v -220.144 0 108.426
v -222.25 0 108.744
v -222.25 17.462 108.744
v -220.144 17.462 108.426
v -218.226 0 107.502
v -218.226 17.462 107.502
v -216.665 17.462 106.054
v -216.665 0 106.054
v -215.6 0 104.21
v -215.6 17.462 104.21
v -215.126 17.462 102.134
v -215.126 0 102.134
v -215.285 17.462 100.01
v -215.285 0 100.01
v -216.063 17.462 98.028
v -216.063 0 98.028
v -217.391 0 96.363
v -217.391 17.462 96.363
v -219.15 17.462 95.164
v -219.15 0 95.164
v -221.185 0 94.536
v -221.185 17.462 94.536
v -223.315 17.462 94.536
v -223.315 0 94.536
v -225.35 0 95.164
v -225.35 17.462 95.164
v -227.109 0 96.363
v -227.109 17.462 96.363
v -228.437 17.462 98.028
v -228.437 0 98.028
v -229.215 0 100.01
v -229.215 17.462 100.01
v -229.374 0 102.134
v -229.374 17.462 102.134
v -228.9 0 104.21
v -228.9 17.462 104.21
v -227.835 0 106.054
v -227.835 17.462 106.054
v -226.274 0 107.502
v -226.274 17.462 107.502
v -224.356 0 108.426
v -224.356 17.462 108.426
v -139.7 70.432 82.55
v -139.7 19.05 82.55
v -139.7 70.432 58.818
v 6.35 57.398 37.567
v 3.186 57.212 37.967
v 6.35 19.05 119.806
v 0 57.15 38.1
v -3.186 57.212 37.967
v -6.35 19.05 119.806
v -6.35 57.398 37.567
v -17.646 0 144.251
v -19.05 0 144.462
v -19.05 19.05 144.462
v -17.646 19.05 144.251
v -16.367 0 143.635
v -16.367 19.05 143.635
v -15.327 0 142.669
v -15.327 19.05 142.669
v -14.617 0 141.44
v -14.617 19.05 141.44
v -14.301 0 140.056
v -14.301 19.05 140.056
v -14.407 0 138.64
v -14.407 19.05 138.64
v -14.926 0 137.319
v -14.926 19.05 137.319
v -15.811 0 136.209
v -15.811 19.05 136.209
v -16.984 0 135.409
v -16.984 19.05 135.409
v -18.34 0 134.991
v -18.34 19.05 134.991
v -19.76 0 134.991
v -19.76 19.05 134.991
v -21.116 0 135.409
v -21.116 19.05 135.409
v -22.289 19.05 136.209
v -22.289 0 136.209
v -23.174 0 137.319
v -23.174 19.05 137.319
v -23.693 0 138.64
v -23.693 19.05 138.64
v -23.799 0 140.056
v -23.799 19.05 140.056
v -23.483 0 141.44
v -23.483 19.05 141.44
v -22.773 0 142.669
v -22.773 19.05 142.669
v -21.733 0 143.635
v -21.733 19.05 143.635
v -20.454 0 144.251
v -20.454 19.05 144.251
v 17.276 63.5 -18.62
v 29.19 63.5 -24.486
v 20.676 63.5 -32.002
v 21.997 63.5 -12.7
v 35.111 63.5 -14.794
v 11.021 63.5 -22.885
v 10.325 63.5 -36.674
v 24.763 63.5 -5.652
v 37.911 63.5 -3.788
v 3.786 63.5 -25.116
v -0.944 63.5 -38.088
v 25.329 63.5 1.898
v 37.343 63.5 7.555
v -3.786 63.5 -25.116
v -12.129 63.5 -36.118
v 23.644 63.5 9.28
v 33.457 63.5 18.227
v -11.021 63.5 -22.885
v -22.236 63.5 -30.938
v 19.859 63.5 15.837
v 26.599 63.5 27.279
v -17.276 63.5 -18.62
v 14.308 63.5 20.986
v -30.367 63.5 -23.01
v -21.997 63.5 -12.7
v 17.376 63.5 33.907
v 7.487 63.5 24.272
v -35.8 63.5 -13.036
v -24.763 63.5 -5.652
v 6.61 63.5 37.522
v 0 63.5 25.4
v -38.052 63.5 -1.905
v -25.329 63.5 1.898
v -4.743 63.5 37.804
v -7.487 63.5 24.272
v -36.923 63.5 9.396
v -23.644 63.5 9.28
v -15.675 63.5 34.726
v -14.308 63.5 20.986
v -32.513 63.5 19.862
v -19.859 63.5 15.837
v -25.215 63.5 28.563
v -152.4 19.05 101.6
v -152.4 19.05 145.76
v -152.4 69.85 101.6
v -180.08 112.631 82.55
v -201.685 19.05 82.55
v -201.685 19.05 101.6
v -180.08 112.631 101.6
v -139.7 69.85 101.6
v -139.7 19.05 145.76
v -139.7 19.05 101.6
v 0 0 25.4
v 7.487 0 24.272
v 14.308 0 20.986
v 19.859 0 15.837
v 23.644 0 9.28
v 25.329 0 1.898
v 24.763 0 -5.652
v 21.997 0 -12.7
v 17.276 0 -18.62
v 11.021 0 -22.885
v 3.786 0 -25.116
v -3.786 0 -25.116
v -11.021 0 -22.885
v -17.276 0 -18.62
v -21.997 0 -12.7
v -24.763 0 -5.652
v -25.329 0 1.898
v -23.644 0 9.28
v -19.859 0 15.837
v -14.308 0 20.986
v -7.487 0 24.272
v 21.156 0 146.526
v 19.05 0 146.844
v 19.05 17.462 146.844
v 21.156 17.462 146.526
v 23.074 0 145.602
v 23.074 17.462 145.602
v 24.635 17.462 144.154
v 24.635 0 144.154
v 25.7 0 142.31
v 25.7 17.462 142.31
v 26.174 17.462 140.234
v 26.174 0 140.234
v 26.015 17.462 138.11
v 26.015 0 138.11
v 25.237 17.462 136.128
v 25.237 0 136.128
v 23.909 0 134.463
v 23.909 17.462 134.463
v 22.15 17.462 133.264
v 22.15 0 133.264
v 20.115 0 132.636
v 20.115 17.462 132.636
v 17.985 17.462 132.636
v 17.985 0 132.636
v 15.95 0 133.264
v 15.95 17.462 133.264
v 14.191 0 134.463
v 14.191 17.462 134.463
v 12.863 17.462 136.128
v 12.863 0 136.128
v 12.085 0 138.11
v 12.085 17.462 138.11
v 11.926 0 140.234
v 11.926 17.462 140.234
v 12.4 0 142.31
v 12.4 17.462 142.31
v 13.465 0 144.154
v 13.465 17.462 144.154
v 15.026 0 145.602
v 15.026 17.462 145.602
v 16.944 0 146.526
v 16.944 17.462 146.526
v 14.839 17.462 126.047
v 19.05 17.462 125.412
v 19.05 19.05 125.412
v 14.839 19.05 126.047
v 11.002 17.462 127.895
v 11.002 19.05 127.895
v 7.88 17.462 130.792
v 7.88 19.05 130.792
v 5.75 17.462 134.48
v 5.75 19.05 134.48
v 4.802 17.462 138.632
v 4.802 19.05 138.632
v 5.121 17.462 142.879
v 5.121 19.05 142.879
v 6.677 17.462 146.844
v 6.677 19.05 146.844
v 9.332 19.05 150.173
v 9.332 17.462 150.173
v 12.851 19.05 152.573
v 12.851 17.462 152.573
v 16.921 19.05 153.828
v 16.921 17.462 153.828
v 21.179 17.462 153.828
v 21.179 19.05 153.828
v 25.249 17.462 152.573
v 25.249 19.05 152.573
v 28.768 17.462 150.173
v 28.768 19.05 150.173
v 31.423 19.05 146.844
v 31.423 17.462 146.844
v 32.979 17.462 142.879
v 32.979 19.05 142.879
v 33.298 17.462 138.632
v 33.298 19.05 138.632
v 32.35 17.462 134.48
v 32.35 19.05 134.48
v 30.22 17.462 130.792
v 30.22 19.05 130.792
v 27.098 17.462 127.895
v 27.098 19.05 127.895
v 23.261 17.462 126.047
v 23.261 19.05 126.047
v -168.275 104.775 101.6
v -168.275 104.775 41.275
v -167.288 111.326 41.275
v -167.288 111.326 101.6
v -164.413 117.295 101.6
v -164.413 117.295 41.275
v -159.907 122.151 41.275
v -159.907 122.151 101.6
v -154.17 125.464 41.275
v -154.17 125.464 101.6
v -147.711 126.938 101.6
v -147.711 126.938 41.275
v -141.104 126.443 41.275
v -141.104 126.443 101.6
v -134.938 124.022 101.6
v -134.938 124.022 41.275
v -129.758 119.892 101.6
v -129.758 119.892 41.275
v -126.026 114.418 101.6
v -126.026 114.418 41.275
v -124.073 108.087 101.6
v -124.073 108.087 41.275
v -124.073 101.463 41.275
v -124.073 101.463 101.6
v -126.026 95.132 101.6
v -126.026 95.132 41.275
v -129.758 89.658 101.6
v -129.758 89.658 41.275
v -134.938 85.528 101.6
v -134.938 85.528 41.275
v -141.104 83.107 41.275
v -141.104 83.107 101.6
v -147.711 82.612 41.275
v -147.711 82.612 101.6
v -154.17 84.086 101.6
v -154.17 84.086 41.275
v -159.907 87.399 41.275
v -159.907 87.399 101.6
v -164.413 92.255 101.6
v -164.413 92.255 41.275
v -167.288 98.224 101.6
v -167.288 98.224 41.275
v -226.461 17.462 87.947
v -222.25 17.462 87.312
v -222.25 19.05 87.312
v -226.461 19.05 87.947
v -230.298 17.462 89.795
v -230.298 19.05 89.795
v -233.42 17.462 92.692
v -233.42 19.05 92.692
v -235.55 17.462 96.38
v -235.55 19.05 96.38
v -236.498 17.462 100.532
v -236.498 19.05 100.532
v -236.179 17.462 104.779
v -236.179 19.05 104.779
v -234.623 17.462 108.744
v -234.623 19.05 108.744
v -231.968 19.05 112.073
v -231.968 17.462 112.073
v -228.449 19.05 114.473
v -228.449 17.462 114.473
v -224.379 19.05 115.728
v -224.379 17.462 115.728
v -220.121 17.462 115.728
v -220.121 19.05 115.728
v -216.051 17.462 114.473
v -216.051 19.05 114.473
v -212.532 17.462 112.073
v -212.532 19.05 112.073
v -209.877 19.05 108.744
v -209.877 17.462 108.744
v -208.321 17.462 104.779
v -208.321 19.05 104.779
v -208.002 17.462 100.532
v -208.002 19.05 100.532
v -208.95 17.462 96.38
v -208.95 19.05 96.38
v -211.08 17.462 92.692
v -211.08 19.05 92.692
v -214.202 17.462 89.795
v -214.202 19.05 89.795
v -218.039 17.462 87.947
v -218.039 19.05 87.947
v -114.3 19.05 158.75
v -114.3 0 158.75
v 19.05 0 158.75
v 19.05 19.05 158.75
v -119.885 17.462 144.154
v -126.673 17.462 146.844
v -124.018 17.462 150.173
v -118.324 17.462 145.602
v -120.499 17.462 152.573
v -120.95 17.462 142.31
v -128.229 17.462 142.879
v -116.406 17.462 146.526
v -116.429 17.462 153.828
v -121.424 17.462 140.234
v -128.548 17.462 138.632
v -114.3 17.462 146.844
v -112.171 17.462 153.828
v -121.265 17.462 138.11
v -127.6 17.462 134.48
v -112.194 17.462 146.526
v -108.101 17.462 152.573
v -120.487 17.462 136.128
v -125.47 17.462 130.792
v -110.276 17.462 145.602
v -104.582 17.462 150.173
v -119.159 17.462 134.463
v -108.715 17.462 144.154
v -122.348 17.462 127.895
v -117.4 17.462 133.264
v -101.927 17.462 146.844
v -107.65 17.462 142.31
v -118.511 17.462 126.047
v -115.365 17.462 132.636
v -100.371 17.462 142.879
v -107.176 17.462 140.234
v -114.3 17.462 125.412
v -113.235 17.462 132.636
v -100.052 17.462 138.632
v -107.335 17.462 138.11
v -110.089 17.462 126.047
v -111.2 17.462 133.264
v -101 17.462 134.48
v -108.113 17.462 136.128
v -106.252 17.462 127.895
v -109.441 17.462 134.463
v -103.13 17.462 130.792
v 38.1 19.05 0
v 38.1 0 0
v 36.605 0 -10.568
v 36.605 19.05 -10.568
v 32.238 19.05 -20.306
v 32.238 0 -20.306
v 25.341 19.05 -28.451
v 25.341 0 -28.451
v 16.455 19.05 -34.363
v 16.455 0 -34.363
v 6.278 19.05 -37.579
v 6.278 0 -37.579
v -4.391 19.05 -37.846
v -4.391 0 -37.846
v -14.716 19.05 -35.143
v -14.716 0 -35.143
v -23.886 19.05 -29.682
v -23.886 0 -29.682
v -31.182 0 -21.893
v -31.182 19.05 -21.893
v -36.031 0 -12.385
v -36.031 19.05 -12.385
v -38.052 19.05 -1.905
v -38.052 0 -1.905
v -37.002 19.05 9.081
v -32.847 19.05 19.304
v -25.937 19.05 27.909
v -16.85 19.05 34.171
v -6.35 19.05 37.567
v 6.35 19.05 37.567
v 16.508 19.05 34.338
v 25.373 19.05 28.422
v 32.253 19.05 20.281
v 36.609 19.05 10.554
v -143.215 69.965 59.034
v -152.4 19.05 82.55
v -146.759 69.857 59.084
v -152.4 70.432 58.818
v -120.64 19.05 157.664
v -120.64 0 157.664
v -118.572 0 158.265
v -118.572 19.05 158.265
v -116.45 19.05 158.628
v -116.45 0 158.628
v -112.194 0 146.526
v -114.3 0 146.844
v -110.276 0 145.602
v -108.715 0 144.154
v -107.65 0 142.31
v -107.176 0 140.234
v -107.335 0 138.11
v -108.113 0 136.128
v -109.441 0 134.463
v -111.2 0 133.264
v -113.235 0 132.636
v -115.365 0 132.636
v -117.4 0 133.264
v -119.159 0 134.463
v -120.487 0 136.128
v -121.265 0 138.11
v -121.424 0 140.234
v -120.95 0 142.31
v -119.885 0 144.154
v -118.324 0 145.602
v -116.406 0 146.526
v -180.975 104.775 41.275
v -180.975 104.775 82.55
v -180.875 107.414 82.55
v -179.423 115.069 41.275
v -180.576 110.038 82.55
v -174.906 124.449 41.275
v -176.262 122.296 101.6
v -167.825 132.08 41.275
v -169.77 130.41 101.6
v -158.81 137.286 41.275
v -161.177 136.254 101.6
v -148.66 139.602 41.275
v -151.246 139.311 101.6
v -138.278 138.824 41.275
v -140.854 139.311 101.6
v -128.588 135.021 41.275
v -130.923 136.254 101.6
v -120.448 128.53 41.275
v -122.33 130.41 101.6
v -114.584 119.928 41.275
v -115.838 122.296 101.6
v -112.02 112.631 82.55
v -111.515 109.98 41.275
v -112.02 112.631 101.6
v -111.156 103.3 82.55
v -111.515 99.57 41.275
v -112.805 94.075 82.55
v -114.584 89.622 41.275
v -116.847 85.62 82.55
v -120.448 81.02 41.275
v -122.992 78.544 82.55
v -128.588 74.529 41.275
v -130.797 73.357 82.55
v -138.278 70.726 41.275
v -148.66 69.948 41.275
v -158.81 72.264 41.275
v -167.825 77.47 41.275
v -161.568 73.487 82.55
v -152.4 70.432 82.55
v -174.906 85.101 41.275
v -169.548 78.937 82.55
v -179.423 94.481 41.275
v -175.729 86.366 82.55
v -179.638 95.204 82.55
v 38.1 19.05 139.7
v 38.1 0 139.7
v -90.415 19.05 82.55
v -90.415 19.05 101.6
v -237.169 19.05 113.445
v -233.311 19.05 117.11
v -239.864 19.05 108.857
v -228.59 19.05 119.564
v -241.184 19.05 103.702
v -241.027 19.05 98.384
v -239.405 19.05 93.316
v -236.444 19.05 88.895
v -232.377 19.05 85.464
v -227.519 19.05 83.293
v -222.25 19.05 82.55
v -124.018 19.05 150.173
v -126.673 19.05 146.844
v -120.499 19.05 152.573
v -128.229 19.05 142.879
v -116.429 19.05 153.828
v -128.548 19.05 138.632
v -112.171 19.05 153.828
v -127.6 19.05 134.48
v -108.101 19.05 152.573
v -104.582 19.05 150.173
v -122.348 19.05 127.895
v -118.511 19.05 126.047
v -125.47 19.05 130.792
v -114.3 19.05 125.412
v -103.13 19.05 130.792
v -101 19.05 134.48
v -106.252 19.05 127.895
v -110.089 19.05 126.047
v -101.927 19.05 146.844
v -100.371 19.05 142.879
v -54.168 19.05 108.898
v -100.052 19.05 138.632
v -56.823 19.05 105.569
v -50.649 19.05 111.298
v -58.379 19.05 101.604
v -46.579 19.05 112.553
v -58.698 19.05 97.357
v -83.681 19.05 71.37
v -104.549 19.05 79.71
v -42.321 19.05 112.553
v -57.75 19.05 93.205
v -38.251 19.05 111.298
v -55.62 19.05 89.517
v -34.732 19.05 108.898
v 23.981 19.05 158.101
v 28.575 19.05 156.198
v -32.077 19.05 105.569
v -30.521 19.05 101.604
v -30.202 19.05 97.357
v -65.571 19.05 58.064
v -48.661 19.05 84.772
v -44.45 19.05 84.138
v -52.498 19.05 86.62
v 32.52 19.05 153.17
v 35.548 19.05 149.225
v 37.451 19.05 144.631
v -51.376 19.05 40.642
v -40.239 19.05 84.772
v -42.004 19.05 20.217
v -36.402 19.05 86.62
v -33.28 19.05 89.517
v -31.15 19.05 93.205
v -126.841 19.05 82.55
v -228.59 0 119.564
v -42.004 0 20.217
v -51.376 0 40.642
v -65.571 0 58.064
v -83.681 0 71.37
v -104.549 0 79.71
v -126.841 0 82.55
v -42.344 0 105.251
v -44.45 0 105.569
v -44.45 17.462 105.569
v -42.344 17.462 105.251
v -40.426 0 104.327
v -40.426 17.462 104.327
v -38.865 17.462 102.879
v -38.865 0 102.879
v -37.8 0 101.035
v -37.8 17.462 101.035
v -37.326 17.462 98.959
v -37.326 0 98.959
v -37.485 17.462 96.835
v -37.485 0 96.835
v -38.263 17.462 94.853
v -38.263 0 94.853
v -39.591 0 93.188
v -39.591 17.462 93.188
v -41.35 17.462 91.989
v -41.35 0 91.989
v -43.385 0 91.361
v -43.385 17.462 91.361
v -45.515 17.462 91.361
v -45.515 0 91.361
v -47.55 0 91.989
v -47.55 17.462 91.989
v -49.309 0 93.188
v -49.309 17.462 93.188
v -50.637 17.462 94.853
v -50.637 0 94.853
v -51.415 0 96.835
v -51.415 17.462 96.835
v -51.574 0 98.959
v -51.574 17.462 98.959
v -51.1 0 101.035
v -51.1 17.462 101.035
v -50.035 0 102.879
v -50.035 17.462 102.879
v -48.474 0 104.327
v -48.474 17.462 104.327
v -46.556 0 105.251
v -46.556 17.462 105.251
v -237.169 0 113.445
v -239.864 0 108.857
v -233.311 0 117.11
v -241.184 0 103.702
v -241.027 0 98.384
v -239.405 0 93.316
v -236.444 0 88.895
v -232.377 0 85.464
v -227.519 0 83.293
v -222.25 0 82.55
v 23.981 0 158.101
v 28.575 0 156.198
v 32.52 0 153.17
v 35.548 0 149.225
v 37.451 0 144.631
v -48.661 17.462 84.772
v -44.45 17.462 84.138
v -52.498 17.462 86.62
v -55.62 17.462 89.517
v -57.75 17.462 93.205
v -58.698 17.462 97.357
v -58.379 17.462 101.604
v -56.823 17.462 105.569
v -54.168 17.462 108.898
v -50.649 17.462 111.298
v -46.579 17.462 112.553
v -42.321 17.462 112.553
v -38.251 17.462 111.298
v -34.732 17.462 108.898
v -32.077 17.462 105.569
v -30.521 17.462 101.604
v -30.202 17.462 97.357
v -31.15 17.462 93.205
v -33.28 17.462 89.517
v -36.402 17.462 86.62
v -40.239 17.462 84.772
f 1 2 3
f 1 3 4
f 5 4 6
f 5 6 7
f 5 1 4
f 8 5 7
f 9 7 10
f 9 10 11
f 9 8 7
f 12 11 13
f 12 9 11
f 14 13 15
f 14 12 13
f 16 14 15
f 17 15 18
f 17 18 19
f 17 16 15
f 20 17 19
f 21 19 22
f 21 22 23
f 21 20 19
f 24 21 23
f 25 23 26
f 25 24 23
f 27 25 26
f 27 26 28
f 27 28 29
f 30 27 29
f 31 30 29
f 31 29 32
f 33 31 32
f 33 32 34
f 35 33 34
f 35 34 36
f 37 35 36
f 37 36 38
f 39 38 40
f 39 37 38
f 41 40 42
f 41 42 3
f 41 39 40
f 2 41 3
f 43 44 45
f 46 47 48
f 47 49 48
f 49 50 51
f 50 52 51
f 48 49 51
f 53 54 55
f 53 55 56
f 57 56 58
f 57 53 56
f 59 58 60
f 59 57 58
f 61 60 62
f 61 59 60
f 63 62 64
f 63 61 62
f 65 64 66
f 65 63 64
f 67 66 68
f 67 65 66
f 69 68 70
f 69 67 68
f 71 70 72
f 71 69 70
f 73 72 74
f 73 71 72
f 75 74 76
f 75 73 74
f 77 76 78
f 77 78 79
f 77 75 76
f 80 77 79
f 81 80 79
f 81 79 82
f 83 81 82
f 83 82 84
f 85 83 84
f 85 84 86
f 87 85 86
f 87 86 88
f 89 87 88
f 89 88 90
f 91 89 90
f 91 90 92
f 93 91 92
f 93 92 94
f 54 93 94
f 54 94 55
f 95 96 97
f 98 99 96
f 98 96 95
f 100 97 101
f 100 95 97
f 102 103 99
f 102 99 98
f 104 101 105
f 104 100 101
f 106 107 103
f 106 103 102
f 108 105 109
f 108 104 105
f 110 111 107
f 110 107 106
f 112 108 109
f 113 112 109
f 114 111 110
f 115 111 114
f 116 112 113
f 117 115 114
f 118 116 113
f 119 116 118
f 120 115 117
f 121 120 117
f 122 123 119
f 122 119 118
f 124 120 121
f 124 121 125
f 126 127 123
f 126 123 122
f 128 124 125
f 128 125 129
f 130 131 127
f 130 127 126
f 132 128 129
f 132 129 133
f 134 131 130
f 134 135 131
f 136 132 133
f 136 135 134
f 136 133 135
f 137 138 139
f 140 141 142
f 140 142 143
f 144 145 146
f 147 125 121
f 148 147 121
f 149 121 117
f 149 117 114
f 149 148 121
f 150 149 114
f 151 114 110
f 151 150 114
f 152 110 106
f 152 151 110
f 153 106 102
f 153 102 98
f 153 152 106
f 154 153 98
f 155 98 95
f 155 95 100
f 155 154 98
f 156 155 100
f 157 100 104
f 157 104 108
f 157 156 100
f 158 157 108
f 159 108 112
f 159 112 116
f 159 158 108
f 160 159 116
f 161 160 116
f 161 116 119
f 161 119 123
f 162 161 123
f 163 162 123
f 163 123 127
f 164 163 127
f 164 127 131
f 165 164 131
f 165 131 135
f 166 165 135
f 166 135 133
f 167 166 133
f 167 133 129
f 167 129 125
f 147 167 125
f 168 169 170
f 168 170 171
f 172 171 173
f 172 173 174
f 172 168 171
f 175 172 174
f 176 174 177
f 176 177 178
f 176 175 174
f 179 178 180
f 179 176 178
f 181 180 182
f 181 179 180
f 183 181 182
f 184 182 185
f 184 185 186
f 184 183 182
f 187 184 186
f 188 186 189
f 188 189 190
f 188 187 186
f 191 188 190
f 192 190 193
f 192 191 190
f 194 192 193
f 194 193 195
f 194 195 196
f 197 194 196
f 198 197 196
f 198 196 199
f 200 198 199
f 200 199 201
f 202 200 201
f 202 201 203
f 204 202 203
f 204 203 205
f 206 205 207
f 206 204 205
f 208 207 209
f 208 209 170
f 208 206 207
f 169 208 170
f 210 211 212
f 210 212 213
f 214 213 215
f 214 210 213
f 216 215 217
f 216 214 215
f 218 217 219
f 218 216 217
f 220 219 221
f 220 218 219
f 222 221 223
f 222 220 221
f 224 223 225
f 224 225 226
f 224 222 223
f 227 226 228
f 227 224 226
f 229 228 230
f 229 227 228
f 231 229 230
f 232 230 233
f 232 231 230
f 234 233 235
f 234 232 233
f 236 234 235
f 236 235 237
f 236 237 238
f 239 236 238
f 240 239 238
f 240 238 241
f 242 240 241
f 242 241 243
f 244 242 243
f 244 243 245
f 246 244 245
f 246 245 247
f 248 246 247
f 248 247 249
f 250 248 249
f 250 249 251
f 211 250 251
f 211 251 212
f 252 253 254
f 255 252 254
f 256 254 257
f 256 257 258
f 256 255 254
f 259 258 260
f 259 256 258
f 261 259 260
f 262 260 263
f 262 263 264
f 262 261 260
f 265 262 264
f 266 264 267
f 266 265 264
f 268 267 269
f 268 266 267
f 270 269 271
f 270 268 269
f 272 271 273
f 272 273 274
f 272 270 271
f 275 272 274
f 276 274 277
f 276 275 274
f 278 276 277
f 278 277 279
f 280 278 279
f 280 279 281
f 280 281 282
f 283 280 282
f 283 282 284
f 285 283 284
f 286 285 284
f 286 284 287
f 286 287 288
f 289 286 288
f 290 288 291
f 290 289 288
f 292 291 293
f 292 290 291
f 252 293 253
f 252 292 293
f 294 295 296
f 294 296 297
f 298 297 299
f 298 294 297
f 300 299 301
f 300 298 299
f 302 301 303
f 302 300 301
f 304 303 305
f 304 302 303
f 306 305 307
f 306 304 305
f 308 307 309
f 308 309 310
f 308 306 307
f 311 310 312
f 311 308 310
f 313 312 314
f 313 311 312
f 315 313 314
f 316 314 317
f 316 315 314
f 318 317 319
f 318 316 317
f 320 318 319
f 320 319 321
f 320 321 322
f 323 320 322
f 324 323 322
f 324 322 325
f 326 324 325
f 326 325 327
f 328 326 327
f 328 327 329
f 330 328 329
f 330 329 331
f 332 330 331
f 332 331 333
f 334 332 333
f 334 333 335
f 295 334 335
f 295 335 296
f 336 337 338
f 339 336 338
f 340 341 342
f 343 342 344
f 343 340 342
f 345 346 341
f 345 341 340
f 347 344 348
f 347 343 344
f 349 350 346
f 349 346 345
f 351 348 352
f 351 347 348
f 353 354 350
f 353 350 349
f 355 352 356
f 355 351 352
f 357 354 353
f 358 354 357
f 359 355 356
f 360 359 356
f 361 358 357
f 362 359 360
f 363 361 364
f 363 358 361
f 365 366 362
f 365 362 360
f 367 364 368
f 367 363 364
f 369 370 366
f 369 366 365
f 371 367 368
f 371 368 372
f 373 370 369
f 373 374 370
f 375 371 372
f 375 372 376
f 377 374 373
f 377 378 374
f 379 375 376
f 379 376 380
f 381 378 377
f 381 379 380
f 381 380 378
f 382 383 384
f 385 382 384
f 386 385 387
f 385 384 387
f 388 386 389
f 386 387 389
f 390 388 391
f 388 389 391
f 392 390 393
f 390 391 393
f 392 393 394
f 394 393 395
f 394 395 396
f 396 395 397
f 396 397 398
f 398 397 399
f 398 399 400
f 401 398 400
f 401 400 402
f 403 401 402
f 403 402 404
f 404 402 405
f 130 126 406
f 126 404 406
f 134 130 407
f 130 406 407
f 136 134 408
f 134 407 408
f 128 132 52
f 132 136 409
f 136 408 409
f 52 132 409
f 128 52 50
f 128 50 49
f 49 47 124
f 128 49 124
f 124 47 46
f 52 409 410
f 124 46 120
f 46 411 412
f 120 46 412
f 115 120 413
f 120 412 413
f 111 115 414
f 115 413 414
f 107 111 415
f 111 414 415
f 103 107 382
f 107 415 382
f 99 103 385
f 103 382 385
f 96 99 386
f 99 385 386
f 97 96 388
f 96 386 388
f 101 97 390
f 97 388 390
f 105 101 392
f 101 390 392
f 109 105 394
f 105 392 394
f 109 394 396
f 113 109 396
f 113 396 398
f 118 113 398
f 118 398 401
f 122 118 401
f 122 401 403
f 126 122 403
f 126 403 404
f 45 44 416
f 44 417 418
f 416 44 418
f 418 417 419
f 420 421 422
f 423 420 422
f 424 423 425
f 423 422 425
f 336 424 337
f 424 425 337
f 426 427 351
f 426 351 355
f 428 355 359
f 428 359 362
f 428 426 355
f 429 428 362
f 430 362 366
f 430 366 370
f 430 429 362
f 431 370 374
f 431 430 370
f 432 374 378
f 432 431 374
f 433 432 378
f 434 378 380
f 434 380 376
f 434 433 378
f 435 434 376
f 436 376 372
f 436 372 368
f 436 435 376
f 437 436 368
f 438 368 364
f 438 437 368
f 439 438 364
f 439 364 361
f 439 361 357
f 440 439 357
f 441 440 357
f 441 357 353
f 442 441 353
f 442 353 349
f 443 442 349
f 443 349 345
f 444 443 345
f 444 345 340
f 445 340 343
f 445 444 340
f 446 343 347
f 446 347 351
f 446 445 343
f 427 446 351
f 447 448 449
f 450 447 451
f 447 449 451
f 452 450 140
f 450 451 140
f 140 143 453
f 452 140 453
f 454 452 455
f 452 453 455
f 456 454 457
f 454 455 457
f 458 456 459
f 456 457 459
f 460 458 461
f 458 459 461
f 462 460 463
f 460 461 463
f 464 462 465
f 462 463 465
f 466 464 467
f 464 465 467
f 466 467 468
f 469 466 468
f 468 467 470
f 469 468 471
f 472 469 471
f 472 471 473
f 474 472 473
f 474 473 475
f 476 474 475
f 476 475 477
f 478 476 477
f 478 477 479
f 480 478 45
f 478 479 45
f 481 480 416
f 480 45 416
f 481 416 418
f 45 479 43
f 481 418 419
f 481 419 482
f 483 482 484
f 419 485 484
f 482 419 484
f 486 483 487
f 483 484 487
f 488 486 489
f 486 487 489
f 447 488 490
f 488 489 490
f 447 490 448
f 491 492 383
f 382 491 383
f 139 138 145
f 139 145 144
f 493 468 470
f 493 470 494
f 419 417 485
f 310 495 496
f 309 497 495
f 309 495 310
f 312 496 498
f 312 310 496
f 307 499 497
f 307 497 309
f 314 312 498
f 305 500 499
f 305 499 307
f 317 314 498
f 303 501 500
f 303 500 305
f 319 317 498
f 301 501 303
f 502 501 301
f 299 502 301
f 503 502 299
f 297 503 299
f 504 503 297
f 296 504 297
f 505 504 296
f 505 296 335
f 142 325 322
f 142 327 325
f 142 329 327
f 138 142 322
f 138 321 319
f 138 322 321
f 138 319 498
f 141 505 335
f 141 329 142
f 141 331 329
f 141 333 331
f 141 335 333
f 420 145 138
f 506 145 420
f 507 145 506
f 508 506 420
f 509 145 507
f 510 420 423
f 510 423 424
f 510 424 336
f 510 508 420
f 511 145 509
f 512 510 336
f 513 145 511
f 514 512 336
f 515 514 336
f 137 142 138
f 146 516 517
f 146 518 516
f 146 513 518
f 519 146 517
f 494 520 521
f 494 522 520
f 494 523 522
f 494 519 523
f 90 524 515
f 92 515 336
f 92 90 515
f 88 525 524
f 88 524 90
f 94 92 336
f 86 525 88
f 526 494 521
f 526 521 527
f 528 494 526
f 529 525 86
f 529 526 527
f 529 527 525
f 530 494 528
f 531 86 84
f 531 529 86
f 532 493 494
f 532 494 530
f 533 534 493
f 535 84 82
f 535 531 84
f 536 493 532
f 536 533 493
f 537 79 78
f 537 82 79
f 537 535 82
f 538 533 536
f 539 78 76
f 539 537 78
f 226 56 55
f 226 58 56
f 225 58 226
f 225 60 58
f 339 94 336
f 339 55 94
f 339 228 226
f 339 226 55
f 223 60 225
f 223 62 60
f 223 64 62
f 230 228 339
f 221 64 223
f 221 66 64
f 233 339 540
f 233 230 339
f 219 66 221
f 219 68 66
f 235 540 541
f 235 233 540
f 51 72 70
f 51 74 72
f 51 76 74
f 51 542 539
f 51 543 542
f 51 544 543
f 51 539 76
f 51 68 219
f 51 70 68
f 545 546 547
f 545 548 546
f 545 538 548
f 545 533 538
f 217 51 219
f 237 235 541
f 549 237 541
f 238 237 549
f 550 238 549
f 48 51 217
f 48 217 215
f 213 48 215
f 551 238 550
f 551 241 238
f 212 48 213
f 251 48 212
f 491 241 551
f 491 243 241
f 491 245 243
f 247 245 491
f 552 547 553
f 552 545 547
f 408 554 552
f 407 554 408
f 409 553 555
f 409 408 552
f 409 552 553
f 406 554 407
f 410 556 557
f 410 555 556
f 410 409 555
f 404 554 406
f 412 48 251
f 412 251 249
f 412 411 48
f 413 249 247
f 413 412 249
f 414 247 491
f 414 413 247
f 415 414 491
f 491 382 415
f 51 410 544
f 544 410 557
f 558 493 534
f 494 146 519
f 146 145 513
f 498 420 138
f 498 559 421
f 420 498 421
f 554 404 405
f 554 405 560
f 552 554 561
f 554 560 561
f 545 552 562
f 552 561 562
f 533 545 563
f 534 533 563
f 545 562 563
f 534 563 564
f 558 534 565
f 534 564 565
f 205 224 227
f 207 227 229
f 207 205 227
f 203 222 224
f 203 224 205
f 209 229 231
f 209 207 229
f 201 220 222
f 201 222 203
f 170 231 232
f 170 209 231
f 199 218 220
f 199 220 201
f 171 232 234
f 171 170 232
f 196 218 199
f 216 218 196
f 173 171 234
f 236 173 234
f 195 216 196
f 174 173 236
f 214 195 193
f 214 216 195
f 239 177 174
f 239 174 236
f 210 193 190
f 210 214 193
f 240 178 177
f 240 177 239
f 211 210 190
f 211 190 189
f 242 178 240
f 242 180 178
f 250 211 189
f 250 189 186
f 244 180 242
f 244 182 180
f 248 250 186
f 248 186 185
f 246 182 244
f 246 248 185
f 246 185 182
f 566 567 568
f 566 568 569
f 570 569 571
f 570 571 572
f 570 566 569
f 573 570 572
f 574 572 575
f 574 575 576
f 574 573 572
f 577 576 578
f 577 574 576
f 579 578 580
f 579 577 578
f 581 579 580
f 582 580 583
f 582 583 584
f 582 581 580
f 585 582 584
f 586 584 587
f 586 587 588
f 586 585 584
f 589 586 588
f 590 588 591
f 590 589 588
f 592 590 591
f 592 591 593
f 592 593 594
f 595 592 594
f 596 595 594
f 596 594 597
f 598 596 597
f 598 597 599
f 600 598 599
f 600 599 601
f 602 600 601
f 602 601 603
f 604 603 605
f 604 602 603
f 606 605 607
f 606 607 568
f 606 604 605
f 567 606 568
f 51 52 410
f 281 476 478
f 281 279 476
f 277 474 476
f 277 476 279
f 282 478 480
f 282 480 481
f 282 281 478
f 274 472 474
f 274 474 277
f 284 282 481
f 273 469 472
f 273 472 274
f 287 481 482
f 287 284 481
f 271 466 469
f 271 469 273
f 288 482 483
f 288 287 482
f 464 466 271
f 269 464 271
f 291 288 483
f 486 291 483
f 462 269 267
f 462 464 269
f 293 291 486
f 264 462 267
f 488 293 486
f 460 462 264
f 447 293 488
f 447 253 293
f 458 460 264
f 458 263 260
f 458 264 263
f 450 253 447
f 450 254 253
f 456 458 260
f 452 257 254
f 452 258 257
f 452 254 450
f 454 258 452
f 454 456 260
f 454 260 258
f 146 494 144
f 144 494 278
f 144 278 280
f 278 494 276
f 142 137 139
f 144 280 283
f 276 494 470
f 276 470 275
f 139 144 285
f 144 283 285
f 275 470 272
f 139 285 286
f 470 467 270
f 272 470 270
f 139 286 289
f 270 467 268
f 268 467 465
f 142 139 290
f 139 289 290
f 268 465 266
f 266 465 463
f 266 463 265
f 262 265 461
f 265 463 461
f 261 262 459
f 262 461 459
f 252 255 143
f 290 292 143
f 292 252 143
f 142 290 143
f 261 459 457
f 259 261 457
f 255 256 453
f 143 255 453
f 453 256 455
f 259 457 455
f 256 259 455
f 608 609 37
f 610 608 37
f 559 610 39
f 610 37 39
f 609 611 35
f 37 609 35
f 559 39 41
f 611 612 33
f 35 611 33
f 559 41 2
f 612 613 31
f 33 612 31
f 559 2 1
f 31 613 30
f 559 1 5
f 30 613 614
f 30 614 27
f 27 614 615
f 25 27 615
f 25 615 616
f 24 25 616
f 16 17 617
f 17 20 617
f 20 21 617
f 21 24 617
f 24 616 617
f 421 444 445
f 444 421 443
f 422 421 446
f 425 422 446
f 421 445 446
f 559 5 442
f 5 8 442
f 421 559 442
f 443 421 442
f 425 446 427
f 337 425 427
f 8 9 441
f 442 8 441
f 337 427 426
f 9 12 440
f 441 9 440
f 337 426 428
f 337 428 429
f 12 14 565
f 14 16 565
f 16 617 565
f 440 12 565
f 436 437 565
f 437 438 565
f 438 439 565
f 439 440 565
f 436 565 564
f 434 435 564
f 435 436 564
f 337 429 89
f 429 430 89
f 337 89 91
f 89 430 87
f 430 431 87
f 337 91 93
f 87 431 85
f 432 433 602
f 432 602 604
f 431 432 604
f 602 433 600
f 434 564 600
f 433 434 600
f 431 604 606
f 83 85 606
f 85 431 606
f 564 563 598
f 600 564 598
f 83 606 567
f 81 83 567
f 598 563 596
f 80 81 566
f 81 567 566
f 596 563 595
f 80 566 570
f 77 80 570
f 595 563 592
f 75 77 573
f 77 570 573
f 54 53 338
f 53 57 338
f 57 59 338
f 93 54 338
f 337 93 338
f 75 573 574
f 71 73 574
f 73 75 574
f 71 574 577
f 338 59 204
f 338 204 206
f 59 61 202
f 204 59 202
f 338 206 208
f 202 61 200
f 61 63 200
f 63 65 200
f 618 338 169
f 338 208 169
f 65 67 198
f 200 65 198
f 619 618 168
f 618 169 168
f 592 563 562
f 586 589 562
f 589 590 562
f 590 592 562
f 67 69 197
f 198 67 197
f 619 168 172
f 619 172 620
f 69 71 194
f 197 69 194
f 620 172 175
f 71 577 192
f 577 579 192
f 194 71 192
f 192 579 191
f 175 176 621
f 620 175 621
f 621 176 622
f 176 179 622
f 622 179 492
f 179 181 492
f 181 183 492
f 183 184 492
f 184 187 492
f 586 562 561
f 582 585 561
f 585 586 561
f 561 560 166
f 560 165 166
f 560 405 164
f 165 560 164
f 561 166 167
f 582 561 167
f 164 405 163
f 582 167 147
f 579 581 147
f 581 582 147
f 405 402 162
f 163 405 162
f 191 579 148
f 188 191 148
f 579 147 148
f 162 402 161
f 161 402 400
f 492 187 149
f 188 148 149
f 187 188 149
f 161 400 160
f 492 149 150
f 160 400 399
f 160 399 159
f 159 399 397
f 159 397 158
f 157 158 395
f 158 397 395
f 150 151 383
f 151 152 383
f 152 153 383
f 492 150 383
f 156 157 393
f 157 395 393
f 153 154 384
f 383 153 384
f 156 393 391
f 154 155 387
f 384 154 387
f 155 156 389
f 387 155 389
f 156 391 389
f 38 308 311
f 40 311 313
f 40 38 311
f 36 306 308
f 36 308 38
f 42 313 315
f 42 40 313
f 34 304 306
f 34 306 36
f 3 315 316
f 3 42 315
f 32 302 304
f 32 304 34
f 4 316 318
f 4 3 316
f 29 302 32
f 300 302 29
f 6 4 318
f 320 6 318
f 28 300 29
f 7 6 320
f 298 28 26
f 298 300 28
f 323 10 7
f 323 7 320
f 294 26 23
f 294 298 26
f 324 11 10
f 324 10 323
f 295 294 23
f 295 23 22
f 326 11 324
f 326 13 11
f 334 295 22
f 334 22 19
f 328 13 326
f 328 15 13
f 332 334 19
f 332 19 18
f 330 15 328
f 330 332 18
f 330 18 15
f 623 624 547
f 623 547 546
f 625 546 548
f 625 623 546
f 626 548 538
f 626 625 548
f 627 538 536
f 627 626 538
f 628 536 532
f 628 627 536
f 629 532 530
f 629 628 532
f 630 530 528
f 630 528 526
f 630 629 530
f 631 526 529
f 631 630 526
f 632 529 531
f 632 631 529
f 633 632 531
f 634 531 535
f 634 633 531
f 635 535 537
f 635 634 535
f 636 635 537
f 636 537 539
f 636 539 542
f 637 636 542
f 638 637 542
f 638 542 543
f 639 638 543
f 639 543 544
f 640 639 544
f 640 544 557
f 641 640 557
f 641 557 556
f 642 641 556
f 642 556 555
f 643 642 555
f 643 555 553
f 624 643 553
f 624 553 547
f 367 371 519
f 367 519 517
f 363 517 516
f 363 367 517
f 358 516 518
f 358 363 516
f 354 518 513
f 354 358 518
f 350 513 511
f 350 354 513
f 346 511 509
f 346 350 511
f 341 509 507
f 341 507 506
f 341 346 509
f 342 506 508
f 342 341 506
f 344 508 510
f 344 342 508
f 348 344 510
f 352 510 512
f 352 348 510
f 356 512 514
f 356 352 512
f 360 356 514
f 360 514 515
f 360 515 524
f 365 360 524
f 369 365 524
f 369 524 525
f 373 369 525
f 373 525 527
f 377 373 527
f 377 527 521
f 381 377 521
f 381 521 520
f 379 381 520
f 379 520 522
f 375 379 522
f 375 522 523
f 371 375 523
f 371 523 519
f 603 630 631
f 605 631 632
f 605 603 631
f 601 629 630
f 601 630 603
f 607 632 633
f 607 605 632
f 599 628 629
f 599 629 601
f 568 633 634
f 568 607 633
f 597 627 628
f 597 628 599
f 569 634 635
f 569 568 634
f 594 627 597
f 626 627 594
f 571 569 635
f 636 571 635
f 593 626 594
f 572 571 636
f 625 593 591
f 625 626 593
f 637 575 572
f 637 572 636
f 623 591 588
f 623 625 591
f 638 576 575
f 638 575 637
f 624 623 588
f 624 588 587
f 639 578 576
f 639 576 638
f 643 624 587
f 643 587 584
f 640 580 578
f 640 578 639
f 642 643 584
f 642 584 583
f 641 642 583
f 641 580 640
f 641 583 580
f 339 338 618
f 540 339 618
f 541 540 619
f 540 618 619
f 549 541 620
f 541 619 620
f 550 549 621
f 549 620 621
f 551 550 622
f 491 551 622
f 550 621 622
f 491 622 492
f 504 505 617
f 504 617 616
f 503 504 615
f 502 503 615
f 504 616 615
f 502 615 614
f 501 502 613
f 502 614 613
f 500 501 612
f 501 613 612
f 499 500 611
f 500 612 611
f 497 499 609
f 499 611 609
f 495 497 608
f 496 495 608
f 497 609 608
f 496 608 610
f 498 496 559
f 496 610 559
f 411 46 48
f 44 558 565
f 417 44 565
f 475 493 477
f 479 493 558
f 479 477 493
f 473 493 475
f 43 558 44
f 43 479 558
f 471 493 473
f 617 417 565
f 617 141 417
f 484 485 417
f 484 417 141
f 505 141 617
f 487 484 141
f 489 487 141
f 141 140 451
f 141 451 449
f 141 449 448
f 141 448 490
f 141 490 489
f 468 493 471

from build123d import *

# Parameters (mm, degrees)
SKETCH2_R           = 25.4
SKETCH2_R_2         = 4.7625
SKETCH2_R_3         = 7.14375
BOSS_EXTRUDE1_DEPTH = 17.4625
SKETCH2_4_R         = 25.4
SKETCH2_4_R_2       = 14.2875
SKETCH2_4_R_3       = 4.7625
BOSS_EXTRUDE2_DEPTH = 19.05
SKETCH2_5_R         = 25.4
BOSS_EXTRUDE3_DEPTH = 63.5
SKETCH4_R           = 22.225
BOSS_EXTRUDE4_DEPTH = 19.05
BOSS_EXTRUDE5_START = 41.275
SKETCH4_5_R         = 22.225
BOSS_EXTRUDE5_DEPTH = 41.275
RIB1_REACH          = 322.848
SKETCH5_WALL_W      = 733.847979228
SKETCH5_WALL_H      = 12.7
RIB2_REACH          = 282.408
SKETCH6_WALL_W      = 630.127475074
SKETCH6_WALL_H      = 12.7
RIB3_REACH          = 282.408
SKETCH7_WALL_W      = 618.773406406
SKETCH7_WALL_H      = 12.7


with BuildPart() as part:
    # Sketch2 → Boss-Extrude1 (new body)
    with BuildSketch(Plane(origin=(0, 0, 0), x_dir=(1, 0, 0), z_dir=(0, 1, 0))):
        with BuildLine():
            ThreePointArc((38.1, 0), (0.952797982, 38.088084436), (-38.052345197, 1.905))
            ThreePointArc((-38.052345197, 1.905), (-65.571053954, -58.064169637), (-126.841150657, -82.55))
            Line((-126.841150657, -82.55), (-222.25, -82.55))
            ThreePointArc((-222.25, -82.55), (-241.02652856, -98.383717171), (-228.590223243, -119.563965855))
            Line((-228.590223243, -119.563965855), (-120.640223243, -157.663965855))
            ThreePointArc((-120.640223243, -157.663965855), (-117.516282829, -158.47652856), (-114.3, -158.75))
            Line((-114.3, -158.75), (19.05, -158.75))
            ThreePointArc((19.05, -158.75), (32.520384182, -153.170384182), (38.1, -139.7))
            Line((38.1, -139.7), (38.1, 0))
        make_face()
        Circle(SKETCH2_R, mode=Mode.SUBTRACT)
        with Locations((-19.05, -139.7)):
            Circle(SKETCH2_R_2, mode=Mode.SUBTRACT)
        with Locations((-44.45, -98.425)):
            Circle(SKETCH2_R_3, mode=Mode.SUBTRACT)
        with Locations((-114.3, -139.7)):
            Circle(SKETCH2_R_3, mode=Mode.SUBTRACT)
        with Locations((-222.25, -101.6)):
            Circle(SKETCH2_R_3, mode=Mode.SUBTRACT)
        with Locations((19.05, -139.7)):
            Circle(SKETCH2_R_3, mode=Mode.SUBTRACT)
    extrude(amount=BOSS_EXTRUDE1_DEPTH)

    # Sketch2<4> → Boss-Extrude2 (add)
    with BuildSketch(Plane(origin=(0, 0, 0), x_dir=(1, 0, 0), z_dir=(0, 1, 0))):
        with BuildLine():
            ThreePointArc((38.1, 0), (0.952797982, 38.088084436), (-38.052345197, 1.905))
            ThreePointArc((-38.052345197, 1.905), (-65.571053954, -58.064169637), (-126.841150657, -82.55))
            Line((-126.841150657, -82.55), (-222.25, -82.55))
            ThreePointArc((-222.25, -82.55), (-241.02652856, -98.383717171), (-228.590223243, -119.563965855))
            Line((-228.590223243, -119.563965855), (-120.640223243, -157.663965855))
            ThreePointArc((-120.640223243, -157.663965855), (-117.516282829, -158.47652856), (-114.3, -158.75))
            Line((-114.3, -158.75), (19.05, -158.75))
            ThreePointArc((19.05, -158.75), (32.520384182, -153.170384182), (38.1, -139.7))
            Line((38.1, -139.7), (38.1, 0))
        make_face()
        Circle(SKETCH2_4_R, mode=Mode.SUBTRACT)
        with Locations((-44.45, -98.425)):
            Circle(SKETCH2_4_R_2, mode=Mode.SUBTRACT)
        with Locations((-114.3, -139.7)):
            Circle(SKETCH2_4_R_2, mode=Mode.SUBTRACT)
        with Locations((-222.25, -101.6)):
            Circle(SKETCH2_4_R_2, mode=Mode.SUBTRACT)
        with Locations((-19.05, -139.7)):
            Circle(SKETCH2_4_R_3, mode=Mode.SUBTRACT)
        with Locations((19.05, -139.7)):
            Circle(SKETCH2_4_R_2, mode=Mode.SUBTRACT)
    extrude(amount=BOSS_EXTRUDE2_DEPTH)

    # Sketch2<5> → Boss-Extrude3 (add)
    with BuildSketch(Plane(origin=(0, 0, 0), x_dir=(1, 0, 0), z_dir=(0, 1, 0))):
        with BuildLine():
            ThreePointArc((-38.052345197, 1.905), (-0.952797982, -38.088084436), (38.1, 0))
            ThreePointArc((38.1, 0), (0.952797982, 38.088084436), (-38.052345197, 1.905))
        make_face()
        Circle(SKETCH2_5_R, mode=Mode.SUBTRACT)
    extrude(amount=BOSS_EXTRUDE3_DEPTH)

    # Sketch4 → Boss-Extrude4 (add)
    with BuildSketch(Plane(origin=(0, 0, 82.55), x_dir=(-1, 0, 0), z_dir=(0, 0, -1))):
        with BuildLine():
            Line((201.684846649, 19.05), (180.079874513, 112.631415573))
            ThreePointArc((180.079874513, 112.631415573), (146.05, 139.7), (112.020125487, 112.631415573))
            Line((112.020125487, 112.631415573), (90.415153351, 19.05))
            Line((90.415153351, 19.05), (201.684846649, 19.05))
        make_face()
        with Locations((146.05, 104.775)):
            Circle(SKETCH4_R, mode=Mode.SUBTRACT)
    extrude(amount=-BOSS_EXTRUDE4_DEPTH)

    # Sketch4<5> → Boss-Extrude5 (add)
    with BuildSketch(Plane(origin=(0, 0, 82.55), x_dir=(-1, 0, 0), z_dir=(0, 0, -1)).offset(BOSS_EXTRUDE5_START)):
        with BuildLine():
            ThreePointArc((180.975, 104.775), (180.75049706, 108.728622241), (180.079874513, 112.631415573))
            ThreePointArc((180.079874513, 112.631415573), (146.05, 139.7), (112.020125487, 112.631415573))
            ThreePointArc((112.020125487, 112.631415573), (142.096377759, 70.07450294), (180.975, 104.775))
        make_face()
        with Locations((146.05, 104.775)):
            Circle(SKETCH4_5_R, mode=Mode.SUBTRACT)
    extrude(amount=-BOSS_EXTRUDE5_DEPTH)

    # Sketch5 wall → Rib1 (add, up to next)
    with BuildSketch(Plane(origin=(0, 38.1, 78.952856836), x_dir=(0, -0.422618261742, 0.906307787036), z_dir=(0, -0.906307787036, -0.422618261742)), mode=Mode.PRIVATE) as rib1_sk1:
        Rectangle(SKETCH5_WALL_W, SKETCH5_WALL_H)
    rib1_tool1 = extrude(rib1_sk1.sketch, amount=RIB1_REACH, mode=Mode.PRIVATE) - part.part
    add(rib1_tool1.solids().sort_by_distance((0, 38.1, 78.952856836))[0])

    # Sketch6 wall → Rib2 (add, up to next)
    with BuildSketch(Plane(origin=(-146.05, 44.45, 123.67988314), x_dir=(0, 0.754709580223, -0.65605902899), z_dir=(0, 0.65605902899, 0.754709580223)), mode=Mode.PRIVATE) as rib2_sk1:
        Rectangle(SKETCH6_WALL_W, SKETCH6_WALL_H)
    rib2_tool1 = extrude(rib2_sk1.sketch, amount=-RIB2_REACH, mode=Mode.PRIVATE) - part.part
    add(rib2_tool1.solids().sort_by_distance((-146.05, 44.45, 123.67988314))[0])

    # Sketch7 wall → Rib3 (add, up to next)
    with BuildSketch(Plane(origin=(-146.05, 44.45, 70.818630511), x_dir=(0, 0.907846577763, -0.41930250565), z_dir=(0, 0.41930250565, 0.907846577763)), mode=Mode.PRIVATE) as rib3_sk1:
        Rectangle(SKETCH7_WALL_W, SKETCH7_WALL_H)
    rib3_tool1 = extrude(rib3_sk1.sketch, amount=RIB3_REACH, mode=Mode.PRIVATE) - part.part
    add(rib3_tool1.solids().sort_by_distance((-146.05, 44.45, 70.818630511))[0])


solid = part.part
